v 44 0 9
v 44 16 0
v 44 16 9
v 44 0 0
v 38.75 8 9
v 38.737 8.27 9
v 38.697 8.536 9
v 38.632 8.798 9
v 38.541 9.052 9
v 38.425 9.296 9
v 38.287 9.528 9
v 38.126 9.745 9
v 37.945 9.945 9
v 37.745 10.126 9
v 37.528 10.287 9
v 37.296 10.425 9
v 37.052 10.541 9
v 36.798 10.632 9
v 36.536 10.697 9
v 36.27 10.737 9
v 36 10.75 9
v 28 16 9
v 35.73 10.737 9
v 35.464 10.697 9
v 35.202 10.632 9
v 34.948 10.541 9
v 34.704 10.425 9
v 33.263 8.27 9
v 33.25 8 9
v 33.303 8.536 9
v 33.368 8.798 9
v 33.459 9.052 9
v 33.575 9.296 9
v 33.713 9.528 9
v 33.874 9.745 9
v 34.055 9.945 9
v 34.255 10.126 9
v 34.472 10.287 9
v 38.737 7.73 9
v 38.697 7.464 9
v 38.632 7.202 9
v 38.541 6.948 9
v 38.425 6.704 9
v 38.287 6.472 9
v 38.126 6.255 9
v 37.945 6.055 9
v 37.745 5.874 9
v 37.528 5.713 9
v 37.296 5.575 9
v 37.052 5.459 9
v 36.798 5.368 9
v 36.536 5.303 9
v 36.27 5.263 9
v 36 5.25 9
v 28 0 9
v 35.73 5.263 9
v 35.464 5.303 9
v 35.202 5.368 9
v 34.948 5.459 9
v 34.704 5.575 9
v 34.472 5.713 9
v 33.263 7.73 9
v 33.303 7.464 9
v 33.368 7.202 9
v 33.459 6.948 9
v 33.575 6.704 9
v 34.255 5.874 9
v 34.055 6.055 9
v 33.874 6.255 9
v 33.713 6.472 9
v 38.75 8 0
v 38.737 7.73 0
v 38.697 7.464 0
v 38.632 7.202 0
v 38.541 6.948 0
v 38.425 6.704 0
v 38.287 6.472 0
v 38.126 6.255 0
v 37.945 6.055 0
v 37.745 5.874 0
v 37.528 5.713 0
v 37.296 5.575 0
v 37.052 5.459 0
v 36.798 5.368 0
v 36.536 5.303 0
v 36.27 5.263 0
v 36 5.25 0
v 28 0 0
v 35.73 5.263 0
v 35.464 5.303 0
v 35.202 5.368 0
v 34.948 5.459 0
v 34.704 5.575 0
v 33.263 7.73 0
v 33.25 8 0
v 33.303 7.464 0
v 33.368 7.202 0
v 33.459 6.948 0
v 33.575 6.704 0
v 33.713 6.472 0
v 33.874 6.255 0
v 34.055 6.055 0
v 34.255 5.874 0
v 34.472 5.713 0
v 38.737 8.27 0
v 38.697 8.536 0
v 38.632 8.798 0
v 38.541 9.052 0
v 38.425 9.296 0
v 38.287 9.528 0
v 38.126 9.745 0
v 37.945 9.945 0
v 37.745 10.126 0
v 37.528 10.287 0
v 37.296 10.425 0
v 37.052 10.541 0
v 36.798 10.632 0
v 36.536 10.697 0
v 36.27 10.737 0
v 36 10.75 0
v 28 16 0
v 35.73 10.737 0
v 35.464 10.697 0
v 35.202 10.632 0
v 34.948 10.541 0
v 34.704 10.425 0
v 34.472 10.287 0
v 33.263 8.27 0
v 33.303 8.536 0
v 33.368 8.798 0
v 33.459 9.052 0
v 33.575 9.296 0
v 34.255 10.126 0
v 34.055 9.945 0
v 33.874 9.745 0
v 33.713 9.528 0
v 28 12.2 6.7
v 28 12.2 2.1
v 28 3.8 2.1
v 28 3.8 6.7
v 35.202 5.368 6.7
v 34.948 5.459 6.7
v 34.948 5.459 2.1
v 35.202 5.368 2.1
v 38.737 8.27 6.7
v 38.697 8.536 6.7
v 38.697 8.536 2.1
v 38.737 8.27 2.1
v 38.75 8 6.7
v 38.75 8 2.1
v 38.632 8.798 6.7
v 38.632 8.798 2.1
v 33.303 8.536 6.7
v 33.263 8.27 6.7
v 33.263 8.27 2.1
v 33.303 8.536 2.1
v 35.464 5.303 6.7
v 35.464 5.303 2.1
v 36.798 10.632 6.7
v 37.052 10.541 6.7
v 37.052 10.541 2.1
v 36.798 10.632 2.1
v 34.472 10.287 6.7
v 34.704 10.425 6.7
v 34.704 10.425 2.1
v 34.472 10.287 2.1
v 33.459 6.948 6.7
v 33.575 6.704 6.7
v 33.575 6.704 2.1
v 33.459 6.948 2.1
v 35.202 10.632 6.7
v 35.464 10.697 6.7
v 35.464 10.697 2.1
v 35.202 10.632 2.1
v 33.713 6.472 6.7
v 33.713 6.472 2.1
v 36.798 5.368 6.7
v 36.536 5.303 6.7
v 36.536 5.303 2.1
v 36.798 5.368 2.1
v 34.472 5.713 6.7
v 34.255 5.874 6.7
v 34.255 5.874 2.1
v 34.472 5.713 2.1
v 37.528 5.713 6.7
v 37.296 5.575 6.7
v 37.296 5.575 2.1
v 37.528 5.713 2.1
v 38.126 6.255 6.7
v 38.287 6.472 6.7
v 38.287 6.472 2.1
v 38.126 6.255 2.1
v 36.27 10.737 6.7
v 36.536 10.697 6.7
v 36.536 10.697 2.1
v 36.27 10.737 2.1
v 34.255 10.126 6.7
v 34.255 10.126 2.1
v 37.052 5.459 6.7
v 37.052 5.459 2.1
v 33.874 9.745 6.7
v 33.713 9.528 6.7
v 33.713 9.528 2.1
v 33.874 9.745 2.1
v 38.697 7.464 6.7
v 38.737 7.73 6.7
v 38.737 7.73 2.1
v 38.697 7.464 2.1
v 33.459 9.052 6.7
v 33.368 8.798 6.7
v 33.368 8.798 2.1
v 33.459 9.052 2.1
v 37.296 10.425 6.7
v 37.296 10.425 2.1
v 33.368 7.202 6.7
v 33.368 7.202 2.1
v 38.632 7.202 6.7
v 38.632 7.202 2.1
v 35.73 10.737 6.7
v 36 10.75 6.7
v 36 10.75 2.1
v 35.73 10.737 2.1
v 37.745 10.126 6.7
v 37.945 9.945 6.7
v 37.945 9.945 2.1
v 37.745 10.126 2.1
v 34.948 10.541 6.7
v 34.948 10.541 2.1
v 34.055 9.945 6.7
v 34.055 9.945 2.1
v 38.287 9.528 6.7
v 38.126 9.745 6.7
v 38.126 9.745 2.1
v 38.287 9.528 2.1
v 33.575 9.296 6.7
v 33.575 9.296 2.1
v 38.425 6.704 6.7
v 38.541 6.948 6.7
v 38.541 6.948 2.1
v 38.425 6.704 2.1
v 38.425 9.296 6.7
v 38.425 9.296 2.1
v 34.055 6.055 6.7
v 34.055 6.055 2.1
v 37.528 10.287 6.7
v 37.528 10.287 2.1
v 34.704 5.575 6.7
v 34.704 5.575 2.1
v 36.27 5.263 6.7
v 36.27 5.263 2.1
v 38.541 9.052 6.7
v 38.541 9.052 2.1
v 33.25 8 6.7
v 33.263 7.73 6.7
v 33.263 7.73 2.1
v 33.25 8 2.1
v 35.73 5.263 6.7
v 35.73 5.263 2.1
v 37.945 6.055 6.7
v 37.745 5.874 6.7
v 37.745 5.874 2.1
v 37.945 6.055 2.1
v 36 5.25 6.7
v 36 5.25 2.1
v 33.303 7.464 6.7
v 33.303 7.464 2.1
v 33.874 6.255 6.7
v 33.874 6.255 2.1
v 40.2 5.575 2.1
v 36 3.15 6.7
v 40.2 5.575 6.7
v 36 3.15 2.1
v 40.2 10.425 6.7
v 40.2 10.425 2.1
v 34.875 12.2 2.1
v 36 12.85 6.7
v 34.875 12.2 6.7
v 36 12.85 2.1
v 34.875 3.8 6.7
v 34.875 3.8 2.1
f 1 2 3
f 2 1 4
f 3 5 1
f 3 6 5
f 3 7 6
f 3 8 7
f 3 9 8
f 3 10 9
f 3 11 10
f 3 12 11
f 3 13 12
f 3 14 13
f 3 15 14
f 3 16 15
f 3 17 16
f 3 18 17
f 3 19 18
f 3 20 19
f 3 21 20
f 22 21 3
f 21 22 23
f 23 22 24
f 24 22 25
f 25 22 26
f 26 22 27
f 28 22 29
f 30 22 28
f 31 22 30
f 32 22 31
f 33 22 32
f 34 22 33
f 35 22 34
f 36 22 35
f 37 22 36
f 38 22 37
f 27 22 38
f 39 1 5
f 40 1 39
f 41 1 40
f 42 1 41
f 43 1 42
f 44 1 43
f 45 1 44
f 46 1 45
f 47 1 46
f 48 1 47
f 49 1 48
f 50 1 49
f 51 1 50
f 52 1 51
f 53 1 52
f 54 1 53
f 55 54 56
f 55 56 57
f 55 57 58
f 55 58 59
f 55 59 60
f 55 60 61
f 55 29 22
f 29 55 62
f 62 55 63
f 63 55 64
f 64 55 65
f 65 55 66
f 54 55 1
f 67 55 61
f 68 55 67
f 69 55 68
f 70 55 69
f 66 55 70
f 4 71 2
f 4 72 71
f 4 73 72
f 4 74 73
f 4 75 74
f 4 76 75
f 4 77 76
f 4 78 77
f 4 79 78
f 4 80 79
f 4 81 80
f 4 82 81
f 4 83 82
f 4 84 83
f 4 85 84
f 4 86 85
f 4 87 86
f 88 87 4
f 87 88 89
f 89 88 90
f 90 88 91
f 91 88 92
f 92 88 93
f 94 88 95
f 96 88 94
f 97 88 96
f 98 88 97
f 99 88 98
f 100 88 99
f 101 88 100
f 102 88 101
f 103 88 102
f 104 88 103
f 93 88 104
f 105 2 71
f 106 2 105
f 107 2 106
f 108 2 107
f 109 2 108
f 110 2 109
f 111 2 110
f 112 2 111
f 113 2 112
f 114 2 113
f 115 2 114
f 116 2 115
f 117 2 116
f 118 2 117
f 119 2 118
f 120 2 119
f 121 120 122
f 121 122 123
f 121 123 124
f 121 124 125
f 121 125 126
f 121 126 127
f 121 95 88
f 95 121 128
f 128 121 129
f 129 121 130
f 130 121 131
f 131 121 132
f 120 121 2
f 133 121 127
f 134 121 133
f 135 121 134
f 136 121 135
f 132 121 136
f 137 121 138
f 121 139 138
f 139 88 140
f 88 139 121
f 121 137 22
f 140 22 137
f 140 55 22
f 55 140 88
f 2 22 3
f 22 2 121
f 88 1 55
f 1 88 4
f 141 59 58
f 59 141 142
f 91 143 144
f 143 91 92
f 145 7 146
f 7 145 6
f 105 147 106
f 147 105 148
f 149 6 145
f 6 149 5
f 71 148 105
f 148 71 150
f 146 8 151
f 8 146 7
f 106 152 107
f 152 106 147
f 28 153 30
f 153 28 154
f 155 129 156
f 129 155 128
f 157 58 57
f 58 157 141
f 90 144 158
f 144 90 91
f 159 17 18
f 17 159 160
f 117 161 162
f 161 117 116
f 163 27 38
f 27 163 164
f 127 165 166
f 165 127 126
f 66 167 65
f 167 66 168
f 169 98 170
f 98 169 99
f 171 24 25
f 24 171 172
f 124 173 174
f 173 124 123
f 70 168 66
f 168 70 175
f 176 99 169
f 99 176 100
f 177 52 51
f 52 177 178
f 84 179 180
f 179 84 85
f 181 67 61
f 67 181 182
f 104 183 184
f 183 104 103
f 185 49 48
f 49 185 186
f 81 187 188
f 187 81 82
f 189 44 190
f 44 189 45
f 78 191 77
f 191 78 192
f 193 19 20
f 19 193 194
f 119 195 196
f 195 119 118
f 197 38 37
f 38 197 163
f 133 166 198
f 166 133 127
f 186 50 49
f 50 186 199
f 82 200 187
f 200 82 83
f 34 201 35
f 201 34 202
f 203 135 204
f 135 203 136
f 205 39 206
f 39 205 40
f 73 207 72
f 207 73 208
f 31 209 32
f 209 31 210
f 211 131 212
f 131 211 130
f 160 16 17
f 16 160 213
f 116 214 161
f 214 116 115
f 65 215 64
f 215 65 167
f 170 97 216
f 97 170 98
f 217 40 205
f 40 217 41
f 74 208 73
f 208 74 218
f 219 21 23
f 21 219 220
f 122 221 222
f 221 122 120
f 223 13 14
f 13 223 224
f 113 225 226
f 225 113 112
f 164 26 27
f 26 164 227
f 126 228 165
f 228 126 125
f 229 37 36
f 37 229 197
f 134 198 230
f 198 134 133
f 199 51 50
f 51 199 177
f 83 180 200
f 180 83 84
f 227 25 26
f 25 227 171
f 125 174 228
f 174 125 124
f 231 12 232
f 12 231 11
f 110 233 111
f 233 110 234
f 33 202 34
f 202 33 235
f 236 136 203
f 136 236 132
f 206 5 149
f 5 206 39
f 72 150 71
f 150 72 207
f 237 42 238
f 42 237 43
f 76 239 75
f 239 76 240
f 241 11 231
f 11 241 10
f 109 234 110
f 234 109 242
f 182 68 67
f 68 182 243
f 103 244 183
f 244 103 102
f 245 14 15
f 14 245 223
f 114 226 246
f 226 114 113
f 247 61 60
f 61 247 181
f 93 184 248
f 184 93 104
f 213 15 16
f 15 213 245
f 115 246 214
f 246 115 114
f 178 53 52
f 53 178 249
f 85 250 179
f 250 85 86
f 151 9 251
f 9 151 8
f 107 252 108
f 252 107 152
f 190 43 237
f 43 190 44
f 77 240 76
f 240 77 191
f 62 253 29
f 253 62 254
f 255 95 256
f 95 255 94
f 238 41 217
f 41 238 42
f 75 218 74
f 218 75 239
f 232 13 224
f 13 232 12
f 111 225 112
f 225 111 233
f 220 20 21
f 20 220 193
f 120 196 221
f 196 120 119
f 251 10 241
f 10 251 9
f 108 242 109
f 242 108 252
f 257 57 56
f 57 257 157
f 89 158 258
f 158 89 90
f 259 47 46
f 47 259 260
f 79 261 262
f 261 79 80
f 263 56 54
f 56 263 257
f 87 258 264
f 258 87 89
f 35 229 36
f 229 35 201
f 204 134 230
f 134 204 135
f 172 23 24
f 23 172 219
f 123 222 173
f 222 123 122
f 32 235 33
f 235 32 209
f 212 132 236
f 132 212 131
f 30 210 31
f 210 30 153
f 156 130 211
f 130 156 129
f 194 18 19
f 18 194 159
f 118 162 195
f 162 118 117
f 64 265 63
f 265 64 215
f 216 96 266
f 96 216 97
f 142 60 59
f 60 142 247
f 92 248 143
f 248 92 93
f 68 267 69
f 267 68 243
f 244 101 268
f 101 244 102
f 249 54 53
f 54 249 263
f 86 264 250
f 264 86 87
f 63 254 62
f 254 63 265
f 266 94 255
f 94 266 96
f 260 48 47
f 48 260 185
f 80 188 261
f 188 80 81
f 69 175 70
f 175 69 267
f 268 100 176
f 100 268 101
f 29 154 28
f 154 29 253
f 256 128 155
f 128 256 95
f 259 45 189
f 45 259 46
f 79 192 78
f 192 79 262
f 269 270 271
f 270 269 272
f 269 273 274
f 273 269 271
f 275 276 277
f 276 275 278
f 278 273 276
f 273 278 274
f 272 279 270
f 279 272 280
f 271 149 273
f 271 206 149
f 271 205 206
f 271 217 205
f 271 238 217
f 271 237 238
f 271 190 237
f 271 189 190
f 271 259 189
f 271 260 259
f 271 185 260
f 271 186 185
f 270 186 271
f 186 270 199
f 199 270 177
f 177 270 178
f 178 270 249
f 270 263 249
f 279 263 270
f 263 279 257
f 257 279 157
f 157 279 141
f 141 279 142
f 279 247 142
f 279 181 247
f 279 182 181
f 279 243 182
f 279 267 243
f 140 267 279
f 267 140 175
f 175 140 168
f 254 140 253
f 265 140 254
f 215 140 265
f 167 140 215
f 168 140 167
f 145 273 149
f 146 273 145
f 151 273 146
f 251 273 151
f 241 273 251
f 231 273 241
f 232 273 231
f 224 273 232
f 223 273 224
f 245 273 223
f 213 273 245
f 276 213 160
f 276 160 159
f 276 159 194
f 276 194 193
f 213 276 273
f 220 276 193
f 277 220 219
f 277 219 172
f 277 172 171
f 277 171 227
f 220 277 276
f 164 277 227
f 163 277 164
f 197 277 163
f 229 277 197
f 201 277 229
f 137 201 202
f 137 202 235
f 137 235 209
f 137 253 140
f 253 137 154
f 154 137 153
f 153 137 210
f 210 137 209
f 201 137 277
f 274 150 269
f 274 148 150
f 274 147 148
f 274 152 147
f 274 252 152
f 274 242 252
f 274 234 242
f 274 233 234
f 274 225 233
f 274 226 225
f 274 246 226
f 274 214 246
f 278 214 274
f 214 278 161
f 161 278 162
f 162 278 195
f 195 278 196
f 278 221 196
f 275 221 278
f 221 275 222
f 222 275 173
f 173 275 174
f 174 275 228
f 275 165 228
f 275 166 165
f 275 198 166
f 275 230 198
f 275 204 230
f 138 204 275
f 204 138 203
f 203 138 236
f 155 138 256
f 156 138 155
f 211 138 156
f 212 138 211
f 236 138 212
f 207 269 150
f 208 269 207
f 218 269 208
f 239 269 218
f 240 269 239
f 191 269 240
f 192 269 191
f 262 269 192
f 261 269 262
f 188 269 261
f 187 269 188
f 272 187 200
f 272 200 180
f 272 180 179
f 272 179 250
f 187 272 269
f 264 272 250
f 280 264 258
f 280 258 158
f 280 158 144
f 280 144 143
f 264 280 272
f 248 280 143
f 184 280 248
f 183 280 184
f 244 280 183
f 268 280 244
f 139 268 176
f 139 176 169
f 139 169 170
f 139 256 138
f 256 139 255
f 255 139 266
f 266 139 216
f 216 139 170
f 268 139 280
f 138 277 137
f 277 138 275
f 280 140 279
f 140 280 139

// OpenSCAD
// Simple thread-practice blocks for learning how bolts, clearance holes,
// and captive nuts work together.
//
// Default hardware:
// - M5 hex nut
// - M5 bolt
//
// Print with the large flat face on the bed.

$fn = 64;

block_x = 16;
block_y = 16;
block_z = 9;

bolt_diameter = 5.5;     // Slight clearance for an M5 bolt
nut_flat_width = 8.4;    // Typical M5 nut width across flats + clearance
nut_thickness = 4.4;     // Typical M5 nut thickness + clearance
nut_cover = 2.5;         // Plastic wall left above the nut pocket

module hex_prism(flat_width, height) {
    cylinder(h = height, d = flat_width / cos(30), $fn = 6);
}

module practice_block() {
    difference() {
        cube([block_x, block_y, block_z], center = false);

        // Through-hole for the bolt.
        translate([block_x / 2, block_y / 2, -0.1])
            cylinder(h = block_z + 0.2, d = bolt_diameter);

        // Captive nut pocket on the underside.
        translate([block_x / 2, block_y / 2, block_z - nut_thickness - nut_cover])
            rotate([0, 0, 30])
                hex_prism(nut_flat_width, nut_thickness + 0.2);
    }
}

module side_load_practice_block() {
    difference() {
        cube([block_x, block_y, block_z], center = false);

        // Through-hole for the bolt.
        translate([block_x / 2, block_y / 2, -0.1])
            cylinder(h = block_z + 0.2, d = bolt_diameter);

        // Captive nut pocket.
        translate([block_x / 2, block_y / 2, block_z - nut_thickness - nut_cover])
            rotate([0, 0, 30])
                hex_prism(nut_flat_width, nut_thickness + 0.2);

        // Side slot so the nut can slide into the pocket.
        translate([-0.1, (block_y - nut_flat_width) / 2, block_z - nut_thickness - nut_cover])
            cube([block_x / 2 + 0.1, nut_flat_width, nut_thickness + 0.2], center = false);
    }
}

spacing = 12;

//practice_block();
translate([block_x + spacing, 0, 0])
    side_load_practice_block();
